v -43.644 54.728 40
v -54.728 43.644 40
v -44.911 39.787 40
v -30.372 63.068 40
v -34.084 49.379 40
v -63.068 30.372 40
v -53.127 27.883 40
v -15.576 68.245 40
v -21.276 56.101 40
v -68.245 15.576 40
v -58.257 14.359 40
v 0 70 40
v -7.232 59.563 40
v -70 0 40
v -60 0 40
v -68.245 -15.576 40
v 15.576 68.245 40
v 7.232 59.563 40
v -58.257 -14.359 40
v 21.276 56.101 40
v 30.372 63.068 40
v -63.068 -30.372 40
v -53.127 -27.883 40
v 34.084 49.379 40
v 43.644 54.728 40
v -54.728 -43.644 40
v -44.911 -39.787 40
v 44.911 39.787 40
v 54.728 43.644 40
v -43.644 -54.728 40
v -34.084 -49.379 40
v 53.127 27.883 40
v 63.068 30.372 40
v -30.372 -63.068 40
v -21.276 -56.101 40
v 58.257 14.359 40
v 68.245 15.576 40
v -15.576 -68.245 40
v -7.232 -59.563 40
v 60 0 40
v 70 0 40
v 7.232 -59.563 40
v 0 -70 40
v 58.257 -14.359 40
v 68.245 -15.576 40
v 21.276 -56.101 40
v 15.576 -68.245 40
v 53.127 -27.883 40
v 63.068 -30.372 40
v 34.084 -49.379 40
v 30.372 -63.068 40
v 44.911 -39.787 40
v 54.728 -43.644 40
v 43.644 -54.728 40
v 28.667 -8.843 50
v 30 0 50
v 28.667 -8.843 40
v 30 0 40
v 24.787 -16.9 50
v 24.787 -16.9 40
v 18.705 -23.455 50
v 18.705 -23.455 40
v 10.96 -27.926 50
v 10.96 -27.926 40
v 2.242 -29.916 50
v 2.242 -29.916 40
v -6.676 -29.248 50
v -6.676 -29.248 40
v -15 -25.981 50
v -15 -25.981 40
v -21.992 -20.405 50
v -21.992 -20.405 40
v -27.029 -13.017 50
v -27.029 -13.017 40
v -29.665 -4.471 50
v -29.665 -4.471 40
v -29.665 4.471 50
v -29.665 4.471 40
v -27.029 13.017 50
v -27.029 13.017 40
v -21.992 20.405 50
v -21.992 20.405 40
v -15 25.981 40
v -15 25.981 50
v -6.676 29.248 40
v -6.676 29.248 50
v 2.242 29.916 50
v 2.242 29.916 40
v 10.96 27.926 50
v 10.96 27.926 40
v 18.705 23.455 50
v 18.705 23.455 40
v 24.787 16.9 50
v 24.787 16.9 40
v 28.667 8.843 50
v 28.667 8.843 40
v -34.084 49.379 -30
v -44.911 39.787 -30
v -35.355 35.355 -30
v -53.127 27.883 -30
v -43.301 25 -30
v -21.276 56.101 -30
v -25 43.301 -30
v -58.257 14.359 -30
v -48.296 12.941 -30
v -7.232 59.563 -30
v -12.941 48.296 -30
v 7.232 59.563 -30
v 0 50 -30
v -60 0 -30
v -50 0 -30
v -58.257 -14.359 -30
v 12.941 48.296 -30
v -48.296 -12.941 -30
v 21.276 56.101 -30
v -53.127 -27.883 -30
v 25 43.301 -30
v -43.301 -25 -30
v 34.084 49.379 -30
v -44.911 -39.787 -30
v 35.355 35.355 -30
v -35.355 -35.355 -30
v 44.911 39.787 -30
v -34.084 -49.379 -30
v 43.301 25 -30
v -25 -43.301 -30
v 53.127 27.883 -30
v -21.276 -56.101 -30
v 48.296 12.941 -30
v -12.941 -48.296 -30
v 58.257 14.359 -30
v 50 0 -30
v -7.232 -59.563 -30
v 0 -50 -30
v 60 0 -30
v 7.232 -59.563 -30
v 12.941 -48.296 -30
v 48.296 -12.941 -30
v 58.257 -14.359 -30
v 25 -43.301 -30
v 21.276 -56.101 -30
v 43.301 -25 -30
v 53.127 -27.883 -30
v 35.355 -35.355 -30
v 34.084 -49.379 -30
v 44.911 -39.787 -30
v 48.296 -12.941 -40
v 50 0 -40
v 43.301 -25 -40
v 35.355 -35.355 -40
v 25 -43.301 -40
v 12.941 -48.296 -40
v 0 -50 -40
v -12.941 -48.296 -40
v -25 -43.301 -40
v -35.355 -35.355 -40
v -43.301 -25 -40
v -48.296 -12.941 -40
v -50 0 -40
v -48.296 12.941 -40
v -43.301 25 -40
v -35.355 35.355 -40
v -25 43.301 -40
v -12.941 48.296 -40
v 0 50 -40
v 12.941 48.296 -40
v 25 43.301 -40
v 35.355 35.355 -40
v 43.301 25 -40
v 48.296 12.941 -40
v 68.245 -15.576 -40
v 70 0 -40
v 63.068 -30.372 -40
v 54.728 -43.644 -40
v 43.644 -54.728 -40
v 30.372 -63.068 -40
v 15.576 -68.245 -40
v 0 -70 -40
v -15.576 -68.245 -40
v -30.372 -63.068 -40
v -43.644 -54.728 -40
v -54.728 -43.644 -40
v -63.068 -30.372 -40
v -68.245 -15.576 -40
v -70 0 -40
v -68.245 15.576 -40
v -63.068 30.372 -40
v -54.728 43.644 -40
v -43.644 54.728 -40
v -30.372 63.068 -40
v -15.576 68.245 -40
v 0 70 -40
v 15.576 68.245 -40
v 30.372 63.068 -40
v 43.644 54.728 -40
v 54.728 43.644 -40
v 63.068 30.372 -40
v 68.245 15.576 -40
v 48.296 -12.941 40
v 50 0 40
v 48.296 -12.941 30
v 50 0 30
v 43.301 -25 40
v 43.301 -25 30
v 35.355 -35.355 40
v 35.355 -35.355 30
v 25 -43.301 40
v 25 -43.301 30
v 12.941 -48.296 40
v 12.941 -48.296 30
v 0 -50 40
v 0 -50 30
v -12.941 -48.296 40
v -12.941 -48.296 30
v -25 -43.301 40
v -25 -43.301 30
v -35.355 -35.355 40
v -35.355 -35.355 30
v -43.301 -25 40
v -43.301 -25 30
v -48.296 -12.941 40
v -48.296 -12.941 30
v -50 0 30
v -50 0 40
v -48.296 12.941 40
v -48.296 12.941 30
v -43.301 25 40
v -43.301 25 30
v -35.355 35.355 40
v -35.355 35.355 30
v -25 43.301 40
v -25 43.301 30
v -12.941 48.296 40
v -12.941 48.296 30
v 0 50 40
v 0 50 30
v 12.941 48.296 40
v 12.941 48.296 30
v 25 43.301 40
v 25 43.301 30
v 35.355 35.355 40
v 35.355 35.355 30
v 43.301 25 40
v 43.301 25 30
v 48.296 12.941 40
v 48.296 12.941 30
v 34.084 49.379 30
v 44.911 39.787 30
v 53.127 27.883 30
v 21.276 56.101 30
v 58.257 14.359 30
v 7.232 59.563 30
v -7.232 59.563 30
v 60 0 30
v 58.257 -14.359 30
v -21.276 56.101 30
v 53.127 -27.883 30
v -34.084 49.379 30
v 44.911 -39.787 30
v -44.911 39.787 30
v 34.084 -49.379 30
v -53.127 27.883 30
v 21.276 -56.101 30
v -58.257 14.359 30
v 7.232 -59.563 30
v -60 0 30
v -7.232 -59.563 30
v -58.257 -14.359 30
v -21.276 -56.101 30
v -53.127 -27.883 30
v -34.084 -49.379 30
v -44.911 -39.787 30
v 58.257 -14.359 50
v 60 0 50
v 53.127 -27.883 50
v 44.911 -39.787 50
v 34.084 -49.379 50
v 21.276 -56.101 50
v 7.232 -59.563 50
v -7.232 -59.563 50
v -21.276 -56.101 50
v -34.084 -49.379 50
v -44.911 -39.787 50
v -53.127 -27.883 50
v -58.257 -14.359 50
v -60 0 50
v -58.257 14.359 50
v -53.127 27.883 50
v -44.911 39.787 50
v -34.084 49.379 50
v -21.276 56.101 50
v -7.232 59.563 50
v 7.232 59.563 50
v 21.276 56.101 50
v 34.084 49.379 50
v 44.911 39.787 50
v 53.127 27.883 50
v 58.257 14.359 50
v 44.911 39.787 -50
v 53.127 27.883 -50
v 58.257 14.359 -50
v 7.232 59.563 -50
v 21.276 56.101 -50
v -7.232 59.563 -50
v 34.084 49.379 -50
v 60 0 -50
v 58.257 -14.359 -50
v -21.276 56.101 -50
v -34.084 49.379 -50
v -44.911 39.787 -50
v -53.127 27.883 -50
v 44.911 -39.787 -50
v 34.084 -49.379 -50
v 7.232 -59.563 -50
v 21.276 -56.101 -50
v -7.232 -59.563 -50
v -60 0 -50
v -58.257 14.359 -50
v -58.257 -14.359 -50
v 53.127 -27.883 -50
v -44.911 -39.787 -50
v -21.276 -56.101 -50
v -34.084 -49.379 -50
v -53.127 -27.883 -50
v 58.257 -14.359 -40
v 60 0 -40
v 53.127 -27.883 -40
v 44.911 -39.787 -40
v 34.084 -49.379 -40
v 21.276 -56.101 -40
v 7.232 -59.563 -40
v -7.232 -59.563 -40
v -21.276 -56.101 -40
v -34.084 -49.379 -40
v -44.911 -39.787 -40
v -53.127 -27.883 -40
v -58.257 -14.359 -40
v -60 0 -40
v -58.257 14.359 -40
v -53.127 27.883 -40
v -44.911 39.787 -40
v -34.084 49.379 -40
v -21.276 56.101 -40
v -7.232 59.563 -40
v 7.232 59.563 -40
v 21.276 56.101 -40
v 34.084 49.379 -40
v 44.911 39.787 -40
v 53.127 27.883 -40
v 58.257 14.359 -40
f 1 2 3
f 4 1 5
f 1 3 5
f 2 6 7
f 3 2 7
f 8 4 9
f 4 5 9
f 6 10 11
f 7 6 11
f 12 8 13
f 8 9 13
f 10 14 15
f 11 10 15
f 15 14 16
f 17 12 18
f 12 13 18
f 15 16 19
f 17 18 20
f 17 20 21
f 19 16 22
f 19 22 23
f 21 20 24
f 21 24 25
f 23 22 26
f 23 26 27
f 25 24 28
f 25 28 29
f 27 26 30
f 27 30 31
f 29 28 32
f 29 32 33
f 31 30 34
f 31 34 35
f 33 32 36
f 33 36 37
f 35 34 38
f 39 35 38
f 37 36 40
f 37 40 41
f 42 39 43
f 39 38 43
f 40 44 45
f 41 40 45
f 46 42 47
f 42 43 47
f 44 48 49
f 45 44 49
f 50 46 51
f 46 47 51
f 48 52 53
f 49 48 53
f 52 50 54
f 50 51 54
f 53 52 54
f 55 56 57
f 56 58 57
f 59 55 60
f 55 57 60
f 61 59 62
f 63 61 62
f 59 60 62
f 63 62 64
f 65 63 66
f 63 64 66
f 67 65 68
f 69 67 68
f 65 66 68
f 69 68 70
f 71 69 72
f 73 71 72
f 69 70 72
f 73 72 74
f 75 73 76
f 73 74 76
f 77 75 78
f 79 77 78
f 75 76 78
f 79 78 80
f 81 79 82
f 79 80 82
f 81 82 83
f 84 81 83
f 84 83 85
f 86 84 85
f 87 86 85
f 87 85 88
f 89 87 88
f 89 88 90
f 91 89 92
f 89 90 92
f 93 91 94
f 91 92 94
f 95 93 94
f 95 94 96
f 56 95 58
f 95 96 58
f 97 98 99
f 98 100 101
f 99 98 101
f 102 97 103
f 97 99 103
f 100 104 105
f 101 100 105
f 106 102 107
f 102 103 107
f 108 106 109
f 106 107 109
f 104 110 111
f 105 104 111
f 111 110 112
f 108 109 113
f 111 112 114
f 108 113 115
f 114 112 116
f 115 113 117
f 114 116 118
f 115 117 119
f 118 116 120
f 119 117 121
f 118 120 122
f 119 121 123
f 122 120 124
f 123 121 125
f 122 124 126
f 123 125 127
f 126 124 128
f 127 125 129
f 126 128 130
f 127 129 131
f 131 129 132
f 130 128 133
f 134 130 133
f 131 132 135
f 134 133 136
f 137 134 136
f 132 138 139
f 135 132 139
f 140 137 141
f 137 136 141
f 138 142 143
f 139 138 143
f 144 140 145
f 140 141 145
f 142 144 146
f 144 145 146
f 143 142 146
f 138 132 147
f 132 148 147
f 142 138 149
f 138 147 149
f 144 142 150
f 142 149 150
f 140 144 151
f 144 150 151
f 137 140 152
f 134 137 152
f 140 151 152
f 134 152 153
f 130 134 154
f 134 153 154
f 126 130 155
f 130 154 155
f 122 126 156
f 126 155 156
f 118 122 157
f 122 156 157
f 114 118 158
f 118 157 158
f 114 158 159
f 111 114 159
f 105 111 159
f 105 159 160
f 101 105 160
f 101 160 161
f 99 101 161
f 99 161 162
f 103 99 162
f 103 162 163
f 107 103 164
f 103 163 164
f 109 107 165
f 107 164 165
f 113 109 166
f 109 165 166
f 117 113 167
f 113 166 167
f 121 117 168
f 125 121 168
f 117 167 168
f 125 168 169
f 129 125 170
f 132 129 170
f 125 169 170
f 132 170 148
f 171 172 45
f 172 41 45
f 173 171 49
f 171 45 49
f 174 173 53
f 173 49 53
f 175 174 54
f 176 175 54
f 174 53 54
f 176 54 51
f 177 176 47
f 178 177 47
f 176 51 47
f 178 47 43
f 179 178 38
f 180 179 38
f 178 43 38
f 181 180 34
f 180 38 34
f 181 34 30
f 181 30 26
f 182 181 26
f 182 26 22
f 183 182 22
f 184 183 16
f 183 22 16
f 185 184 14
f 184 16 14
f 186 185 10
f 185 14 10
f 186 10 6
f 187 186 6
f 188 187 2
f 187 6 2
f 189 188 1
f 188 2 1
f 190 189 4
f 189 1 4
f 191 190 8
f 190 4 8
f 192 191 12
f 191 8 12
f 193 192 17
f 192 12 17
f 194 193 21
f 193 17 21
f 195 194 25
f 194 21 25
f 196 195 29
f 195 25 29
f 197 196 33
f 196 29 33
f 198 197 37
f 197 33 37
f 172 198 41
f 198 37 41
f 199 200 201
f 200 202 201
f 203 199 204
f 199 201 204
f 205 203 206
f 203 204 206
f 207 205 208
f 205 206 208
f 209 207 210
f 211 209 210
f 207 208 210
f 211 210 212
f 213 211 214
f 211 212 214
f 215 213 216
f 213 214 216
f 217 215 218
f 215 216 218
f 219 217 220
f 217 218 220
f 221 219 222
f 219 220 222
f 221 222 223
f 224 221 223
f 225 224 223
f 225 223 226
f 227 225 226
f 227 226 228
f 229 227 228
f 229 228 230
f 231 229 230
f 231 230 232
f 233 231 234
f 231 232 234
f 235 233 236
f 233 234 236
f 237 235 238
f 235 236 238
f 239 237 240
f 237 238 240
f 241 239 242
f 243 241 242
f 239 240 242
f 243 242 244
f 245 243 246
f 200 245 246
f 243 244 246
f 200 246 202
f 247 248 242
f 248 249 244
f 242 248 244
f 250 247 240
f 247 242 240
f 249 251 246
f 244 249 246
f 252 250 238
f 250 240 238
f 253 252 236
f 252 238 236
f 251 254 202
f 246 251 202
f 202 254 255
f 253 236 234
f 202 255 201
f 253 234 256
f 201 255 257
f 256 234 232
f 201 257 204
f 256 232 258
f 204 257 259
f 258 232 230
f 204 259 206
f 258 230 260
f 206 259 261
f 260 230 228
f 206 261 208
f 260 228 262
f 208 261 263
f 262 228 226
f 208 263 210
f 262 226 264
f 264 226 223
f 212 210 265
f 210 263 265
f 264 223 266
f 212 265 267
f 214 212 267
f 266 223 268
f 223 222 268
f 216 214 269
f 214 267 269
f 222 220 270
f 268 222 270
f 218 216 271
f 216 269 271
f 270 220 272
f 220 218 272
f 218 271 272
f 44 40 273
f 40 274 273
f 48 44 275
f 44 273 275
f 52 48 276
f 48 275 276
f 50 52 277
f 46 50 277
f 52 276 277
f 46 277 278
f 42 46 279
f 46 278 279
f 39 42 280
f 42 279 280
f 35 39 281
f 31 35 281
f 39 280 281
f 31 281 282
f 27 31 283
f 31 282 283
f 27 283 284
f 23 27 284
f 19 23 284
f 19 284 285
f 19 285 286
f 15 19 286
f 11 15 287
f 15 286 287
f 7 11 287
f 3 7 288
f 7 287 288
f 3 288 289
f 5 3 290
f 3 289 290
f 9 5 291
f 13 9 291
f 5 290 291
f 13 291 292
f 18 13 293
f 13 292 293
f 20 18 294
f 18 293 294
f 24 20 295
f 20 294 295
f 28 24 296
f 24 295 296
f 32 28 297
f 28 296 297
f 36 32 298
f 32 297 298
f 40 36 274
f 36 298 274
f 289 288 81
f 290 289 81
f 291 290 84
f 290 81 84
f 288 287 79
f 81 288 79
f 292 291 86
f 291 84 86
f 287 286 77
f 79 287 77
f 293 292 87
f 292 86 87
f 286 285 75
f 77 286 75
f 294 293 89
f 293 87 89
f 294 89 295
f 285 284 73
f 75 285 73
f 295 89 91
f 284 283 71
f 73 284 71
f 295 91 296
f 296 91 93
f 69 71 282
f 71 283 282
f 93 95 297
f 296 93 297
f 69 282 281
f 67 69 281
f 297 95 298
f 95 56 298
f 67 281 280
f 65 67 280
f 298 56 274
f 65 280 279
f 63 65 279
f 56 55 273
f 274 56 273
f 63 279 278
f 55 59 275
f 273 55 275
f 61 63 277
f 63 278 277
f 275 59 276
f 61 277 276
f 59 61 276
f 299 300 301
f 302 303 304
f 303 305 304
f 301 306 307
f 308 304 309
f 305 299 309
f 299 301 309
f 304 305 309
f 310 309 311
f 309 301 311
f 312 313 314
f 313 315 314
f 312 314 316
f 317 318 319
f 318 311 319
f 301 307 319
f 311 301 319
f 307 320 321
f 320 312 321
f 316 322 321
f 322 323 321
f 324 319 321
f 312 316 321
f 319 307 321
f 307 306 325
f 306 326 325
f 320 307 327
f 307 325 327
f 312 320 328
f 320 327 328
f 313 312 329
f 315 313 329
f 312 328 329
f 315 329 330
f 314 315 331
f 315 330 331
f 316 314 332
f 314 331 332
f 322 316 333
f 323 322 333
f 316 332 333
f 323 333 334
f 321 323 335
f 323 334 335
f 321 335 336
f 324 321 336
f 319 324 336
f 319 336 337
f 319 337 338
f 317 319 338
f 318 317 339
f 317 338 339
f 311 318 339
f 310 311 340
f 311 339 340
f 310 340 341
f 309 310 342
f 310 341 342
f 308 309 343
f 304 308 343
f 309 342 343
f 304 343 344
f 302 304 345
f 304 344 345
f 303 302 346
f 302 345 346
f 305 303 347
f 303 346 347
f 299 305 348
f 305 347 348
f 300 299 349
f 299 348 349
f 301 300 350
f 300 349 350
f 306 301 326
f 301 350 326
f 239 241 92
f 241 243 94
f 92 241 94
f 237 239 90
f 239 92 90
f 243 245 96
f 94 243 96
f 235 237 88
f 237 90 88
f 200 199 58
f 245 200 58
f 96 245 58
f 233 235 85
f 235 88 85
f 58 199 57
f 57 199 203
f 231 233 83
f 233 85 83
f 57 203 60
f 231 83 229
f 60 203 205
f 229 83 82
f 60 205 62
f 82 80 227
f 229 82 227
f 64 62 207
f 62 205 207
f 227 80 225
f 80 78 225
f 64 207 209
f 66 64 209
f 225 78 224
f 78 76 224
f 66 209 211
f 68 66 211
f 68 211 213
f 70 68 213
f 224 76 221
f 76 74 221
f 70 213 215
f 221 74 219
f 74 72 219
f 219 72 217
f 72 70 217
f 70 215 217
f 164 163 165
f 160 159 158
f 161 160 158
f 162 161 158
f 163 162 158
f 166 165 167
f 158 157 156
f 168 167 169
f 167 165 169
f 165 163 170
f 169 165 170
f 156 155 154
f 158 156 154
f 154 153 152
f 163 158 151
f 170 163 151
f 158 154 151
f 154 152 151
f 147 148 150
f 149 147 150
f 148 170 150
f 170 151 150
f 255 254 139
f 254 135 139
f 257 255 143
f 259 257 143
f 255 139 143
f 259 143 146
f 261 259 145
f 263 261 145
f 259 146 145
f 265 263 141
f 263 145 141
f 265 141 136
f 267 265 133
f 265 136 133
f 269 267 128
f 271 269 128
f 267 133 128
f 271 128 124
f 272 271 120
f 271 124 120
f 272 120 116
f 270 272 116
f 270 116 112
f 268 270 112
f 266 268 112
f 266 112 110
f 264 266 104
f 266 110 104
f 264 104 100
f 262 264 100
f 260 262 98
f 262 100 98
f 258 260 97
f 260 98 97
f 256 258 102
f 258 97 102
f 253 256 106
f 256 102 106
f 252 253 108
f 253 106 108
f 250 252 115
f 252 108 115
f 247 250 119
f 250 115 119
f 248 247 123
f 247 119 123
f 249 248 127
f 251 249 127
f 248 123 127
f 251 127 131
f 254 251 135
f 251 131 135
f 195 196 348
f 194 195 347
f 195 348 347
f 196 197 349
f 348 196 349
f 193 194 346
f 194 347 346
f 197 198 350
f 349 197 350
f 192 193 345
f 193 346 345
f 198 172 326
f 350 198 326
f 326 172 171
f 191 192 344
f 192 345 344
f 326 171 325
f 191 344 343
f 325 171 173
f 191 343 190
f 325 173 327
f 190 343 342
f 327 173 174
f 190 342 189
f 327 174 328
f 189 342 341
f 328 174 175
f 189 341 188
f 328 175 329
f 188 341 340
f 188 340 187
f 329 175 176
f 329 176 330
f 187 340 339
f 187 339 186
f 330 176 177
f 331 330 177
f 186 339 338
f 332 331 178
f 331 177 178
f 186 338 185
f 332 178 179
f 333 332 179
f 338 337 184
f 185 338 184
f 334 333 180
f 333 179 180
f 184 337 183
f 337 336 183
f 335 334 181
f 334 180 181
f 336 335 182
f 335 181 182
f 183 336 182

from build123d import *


with BuildPart() as part:
    # Croquis3 → Revolución1 (revolve)
    with BuildSketch(Plane(origin=(0, 0, 0), x_dir=(0, 0, -1), z_dir=(1, 0, 0)), mode=Mode.PRIVATE) as revoluci_n1_sk:
        Polygon((40, 0), (50, 0), (50, 60), (40, 60), (40, 70), (-40, 70), (-40, 60), (-50, 60), (-50, 30), (-40, 30), (-40, 50), (-30, 50), (-30, 60), (30, 60), (30, 50), (40, 50), align=None)
    revolve(revoluci_n1_sk.sketch.rotate(Axis((0, 0, 147.034921683), (0, 0, -1)), 90), axis=Axis((0, 0, 147.034921683), (0, 0, -1)))


solid = part.part
